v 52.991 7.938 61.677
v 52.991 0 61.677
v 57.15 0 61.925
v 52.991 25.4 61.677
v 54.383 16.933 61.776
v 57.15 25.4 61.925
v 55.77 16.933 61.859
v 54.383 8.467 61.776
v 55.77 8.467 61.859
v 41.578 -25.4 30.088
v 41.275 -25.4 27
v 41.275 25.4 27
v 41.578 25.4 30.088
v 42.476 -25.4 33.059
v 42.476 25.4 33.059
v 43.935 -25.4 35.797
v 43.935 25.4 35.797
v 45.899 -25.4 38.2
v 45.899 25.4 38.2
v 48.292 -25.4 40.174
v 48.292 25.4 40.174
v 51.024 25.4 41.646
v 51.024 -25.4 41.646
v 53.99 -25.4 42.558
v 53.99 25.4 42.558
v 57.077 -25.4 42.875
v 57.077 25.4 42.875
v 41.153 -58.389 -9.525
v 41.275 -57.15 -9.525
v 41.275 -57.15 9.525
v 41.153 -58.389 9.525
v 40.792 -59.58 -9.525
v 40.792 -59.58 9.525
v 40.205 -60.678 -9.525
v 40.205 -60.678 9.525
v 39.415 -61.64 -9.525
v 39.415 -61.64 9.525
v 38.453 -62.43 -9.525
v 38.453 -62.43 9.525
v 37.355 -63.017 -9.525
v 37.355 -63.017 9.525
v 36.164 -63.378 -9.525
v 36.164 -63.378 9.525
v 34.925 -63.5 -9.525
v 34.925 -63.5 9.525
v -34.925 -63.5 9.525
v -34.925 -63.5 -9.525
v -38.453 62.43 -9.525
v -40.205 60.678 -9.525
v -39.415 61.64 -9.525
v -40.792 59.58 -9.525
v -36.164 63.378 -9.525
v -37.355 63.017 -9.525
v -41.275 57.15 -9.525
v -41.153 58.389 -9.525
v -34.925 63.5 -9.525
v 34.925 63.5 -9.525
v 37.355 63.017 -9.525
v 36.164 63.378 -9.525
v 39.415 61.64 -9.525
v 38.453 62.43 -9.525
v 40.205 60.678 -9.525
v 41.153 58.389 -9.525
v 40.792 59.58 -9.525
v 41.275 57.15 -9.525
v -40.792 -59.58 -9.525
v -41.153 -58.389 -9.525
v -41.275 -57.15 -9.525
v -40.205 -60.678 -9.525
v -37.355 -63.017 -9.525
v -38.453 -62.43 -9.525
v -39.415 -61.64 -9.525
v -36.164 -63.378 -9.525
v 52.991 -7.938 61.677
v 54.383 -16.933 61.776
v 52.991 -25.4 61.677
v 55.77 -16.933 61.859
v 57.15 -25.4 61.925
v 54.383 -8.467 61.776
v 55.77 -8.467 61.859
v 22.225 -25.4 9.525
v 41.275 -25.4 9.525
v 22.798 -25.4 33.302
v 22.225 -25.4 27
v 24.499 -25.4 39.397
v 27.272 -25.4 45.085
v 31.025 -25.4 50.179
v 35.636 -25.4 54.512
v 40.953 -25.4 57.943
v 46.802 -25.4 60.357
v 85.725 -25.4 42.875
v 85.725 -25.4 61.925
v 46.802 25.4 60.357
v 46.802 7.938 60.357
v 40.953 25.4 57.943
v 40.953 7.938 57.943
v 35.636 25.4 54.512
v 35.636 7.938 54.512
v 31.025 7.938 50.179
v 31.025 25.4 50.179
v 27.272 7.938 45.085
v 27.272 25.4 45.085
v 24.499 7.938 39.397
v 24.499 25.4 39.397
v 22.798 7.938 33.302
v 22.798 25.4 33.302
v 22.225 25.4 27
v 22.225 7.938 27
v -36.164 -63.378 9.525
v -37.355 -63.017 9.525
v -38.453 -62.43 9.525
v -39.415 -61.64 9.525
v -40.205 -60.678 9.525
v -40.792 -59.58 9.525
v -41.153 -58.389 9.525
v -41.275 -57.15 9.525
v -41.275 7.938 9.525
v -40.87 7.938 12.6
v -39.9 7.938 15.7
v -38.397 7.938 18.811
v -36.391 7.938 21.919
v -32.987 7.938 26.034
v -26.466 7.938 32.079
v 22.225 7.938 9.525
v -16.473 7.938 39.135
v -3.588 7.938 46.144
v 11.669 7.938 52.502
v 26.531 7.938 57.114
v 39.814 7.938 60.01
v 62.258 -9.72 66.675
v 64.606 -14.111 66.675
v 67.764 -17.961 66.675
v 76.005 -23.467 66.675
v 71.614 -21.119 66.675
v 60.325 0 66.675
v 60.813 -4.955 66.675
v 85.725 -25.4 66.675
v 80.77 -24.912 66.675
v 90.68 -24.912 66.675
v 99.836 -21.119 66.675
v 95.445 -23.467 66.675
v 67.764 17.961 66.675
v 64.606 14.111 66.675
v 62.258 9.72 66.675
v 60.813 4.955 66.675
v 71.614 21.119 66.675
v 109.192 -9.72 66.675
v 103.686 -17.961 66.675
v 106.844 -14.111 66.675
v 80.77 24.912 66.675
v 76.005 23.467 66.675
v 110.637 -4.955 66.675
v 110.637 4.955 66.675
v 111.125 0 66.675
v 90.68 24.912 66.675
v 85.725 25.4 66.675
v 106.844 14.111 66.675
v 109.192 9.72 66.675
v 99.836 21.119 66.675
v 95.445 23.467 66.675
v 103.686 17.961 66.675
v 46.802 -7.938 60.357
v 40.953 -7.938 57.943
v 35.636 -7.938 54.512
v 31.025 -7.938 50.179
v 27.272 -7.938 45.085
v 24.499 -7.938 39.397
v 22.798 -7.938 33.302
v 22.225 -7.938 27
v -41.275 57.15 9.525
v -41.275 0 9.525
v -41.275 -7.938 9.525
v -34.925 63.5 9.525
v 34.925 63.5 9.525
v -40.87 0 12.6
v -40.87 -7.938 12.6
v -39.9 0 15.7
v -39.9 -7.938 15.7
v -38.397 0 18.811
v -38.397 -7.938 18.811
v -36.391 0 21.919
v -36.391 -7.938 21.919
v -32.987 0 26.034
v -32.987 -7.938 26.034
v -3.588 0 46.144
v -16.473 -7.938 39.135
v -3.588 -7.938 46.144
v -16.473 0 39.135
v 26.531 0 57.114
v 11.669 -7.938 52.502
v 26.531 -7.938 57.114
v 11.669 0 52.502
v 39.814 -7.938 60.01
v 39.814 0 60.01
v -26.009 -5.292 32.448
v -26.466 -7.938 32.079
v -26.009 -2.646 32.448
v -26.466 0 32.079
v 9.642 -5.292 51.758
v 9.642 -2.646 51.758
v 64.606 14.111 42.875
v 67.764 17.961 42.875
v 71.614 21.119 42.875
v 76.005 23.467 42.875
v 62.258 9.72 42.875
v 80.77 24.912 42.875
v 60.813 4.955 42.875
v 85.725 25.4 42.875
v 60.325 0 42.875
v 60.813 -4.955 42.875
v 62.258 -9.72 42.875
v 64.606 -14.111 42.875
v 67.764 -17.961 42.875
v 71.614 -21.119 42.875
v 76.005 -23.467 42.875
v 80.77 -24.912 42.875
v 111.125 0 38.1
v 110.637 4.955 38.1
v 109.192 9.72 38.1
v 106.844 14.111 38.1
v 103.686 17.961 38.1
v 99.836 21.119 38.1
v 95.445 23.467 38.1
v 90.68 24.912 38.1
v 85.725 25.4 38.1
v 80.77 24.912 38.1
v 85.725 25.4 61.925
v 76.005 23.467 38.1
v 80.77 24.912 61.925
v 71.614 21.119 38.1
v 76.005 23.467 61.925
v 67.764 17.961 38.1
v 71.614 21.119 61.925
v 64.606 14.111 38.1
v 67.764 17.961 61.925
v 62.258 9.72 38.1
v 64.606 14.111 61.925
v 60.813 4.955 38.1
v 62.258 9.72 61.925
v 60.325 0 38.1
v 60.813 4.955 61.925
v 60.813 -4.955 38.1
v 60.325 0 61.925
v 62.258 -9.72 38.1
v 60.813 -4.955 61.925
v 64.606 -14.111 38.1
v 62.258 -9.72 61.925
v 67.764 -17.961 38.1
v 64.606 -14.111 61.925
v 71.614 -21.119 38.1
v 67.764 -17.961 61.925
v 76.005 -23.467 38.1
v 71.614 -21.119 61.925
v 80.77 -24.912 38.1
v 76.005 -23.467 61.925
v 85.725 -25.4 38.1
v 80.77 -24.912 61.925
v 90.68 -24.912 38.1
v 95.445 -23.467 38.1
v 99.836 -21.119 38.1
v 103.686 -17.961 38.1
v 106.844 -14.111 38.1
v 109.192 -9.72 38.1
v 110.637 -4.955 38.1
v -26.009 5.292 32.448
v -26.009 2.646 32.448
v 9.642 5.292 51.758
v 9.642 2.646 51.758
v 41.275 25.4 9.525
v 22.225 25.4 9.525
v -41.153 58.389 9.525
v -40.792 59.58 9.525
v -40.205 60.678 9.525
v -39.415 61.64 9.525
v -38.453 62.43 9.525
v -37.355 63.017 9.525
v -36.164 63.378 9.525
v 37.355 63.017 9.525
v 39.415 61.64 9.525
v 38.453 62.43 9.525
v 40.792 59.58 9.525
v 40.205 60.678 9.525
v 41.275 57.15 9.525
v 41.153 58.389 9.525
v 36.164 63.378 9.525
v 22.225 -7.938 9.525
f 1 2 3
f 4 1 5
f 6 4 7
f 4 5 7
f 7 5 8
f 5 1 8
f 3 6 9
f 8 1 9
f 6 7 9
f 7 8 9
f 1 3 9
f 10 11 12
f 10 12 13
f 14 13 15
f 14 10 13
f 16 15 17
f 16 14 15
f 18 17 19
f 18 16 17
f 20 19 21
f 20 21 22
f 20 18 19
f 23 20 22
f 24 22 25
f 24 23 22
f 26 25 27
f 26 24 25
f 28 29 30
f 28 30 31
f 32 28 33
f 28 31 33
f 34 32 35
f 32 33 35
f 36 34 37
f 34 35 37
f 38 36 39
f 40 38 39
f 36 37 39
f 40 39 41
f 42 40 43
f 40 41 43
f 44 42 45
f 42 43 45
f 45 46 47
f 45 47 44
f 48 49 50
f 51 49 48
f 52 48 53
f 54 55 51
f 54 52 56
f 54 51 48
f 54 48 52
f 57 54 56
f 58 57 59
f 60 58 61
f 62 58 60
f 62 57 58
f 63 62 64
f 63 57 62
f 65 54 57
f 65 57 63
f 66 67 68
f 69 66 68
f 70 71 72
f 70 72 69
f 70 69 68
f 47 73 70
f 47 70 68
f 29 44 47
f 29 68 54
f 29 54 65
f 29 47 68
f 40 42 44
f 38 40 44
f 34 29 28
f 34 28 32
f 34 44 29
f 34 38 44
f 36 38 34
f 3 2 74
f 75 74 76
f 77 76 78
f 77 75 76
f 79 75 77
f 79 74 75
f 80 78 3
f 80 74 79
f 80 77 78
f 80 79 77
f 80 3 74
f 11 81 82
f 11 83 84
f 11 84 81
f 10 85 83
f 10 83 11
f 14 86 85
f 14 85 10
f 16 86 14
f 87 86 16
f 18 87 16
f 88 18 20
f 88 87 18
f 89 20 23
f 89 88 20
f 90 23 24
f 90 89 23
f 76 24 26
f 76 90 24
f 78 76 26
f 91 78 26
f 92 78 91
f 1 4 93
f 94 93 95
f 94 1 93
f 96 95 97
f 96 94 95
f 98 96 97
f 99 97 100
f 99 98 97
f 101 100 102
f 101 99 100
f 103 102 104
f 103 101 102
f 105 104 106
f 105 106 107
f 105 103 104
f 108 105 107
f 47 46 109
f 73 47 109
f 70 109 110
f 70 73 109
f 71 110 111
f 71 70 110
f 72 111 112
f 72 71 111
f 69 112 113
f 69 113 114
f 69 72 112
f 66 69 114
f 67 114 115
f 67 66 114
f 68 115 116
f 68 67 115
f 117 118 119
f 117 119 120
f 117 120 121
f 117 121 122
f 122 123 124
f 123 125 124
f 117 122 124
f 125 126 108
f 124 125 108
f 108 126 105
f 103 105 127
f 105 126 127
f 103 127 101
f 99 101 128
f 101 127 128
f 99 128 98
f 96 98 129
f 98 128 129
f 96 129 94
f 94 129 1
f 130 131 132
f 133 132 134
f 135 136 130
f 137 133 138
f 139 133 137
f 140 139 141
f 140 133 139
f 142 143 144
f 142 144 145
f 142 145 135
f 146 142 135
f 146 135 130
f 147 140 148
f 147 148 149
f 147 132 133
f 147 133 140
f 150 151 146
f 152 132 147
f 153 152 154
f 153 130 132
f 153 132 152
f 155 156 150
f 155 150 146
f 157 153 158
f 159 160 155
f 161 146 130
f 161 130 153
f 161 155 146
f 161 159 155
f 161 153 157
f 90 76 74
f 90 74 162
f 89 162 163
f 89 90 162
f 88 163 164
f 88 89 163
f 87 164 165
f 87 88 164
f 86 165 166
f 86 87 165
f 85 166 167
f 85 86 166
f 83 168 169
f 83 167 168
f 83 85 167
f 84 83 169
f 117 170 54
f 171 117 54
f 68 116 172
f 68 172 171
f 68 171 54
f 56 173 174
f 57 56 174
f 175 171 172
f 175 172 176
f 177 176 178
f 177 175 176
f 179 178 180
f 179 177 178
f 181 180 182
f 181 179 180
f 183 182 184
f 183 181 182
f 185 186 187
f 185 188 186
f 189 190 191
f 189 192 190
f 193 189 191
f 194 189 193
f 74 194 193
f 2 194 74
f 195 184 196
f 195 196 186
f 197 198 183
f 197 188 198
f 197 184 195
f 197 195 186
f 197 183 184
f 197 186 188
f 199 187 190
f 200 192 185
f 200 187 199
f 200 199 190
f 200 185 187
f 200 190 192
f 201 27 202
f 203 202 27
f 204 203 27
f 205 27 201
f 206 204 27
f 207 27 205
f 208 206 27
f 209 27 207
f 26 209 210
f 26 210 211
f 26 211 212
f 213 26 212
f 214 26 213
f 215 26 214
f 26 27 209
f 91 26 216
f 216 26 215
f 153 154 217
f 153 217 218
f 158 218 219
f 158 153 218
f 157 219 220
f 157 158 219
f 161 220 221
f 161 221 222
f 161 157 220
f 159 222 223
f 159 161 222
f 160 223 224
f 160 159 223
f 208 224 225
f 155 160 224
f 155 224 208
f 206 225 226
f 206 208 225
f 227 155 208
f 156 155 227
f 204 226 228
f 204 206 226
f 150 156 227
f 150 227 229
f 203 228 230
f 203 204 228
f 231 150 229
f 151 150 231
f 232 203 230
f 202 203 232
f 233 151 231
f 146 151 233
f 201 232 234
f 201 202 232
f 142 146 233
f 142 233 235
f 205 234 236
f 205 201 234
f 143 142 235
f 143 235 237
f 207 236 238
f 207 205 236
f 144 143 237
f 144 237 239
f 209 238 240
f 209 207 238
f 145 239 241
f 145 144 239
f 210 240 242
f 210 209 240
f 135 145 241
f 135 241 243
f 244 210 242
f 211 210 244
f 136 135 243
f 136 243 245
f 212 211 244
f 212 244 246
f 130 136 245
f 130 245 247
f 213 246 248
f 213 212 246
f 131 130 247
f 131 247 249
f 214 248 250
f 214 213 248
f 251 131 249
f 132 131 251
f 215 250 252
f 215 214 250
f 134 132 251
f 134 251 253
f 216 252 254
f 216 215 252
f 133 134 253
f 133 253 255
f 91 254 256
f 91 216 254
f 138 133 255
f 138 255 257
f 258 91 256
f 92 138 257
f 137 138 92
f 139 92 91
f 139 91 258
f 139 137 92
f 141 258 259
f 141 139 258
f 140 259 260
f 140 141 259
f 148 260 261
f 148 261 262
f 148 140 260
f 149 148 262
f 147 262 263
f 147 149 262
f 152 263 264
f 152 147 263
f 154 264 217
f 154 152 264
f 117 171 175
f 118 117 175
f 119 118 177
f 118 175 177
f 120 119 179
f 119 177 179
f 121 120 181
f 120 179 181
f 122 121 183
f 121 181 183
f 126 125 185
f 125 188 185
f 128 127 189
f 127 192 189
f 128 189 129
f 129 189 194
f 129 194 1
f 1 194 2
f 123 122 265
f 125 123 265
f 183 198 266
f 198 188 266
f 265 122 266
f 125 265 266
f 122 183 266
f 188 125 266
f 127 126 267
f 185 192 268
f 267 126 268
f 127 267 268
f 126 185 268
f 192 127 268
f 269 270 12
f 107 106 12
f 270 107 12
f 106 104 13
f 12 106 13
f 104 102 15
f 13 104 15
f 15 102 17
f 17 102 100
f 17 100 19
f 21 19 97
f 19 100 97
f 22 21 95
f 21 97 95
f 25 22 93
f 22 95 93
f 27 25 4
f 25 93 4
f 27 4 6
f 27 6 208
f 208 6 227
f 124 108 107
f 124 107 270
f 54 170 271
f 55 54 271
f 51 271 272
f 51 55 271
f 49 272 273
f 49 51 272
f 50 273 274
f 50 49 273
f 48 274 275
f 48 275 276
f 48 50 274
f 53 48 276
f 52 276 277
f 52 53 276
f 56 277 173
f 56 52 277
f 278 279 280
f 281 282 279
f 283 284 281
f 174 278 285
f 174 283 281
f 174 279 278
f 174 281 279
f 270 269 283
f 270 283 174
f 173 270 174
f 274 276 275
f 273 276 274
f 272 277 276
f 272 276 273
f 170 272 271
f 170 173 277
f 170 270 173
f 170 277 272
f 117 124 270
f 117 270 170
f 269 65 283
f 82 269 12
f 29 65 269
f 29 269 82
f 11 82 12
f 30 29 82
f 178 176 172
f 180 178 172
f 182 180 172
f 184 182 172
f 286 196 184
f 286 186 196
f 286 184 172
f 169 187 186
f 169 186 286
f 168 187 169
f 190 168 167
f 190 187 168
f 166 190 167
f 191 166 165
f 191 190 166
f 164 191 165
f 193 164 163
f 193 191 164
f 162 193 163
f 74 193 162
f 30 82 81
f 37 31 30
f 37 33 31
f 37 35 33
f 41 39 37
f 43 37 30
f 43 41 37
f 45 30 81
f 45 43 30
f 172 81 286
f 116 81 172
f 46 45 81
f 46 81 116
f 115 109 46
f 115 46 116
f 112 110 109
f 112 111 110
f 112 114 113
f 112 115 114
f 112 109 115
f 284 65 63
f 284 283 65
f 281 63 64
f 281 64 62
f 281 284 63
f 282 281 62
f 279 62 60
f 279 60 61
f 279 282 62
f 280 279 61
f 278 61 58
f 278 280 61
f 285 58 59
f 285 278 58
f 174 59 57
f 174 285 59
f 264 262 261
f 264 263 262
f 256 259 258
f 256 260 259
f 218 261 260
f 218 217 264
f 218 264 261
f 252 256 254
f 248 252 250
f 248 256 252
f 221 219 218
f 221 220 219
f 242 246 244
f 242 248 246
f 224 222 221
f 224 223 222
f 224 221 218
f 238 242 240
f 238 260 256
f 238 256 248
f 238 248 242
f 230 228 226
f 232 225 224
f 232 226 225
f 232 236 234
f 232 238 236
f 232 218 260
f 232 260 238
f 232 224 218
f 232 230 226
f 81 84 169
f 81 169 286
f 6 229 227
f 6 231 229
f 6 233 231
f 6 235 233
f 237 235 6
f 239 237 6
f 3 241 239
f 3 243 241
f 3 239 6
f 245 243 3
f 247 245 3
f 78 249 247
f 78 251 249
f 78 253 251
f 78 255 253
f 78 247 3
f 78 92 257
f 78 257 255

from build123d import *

# Parameters (mm, degrees)
F1_DEPTH = 63.5
F0_W     = 25.4
F0_H     = 19.05
F2_DEPTH = 25.4
F3_DEPTH = 7.9375
F5_R     = 6.35


# Not quite as in the source:
# - a feature names something its author has since deleted; it is built from what else it names


with BuildPart() as f1:
    # F0 (on Front) → F1 (new body, symmetric)
    with BuildSketch(Plane.XZ):
        Polygon((41.275, -9.525), (41.275, 9.525), (22.225, 9.525), (-41.275, 9.525), (-41.275, -9.525), align=None)
    extrude(amount=F1_DEPTH, both=True)

    # F0 (on Front) → F2 (join, symmetric)
    with BuildSketch(Plane.XZ):
        with BuildLine():
            Line((22.225, 9.525), (41.275, 9.525))
            Line((41.275, 9.525), (41.275, 27.0003691794))
            ThreePointArc((41.275, 27.0003691794), (45.8987977719, 38.19974744), (57.0767100375, 42.8752))
            Line((57.0767100375, 42.8752), (60.325, 42.8752))
            Line((60.325, 42.8752), (60.325, 61.9252))
            Line((60.325, 61.9252), (57.15, 61.9252))
            add(Edge.make_bspline(
                [(52.9909613243, 61.6768456771), (54.385845827, 61.7839036656), (55.7728431111, 61.8669849), (57.15, 61.9252)],
                knots=[107.9985895846, 107.9985895846, 107.9985895846, 107.9985895846, 111.5045361635, 111.5045361635, 111.5045361635, 111.5045361635], degree=3))
            ThreePointArc((52.9909613243, 61.6768456771), (31.0252028644, 50.1790360873), (22.225, 27.0003691794))
            Line((22.225, 27.0003691794), (22.225, 9.525))
        make_face()
        with Locations((73.025, 52.4002)):
            Rectangle(F0_W, F0_H)
    extrude(amount=F2_DEPTH, both=True)

    # F0 (on Front) → F3 (join, symmetric)
    with BuildSketch(Plane.XZ):
        with BuildLine():
            Line((-41.275, 9.525), (22.225, 9.525))
            Line((22.225, 9.525), (22.225, 27.0003691794))
            ThreePointArc((22.225, 27.0003691794), (31.0252028644, 50.1790360873), (52.9909613243, 61.6768456771))
            add(Edge.make_bspline(
                [(-41.275, 9.525), (-40.4304762971, 32.3293201332), (10.0223776518, 58.3789883087), (52.9909613243, 61.6768456771)],
                knots=[0, 0, 0, 0, 107.9985895846, 107.9985895846, 107.9985895846, 107.9985895846], degree=3))
        make_face()
    extrude(amount=F3_DEPTH, both=True)

    # F0 (on Front) → F4 (revolve)
    with BuildSketch(Plane.XZ):
        Polygon((85.725, 61.9252), (85.725, 42.8752), (85.725, 38.1), (111.125, 38.1), (111.125, 66.675), (85.725, 66.675), align=None)
    revolve(axis=Axis((85.725, 0, 52.3875), (0, 0, 1)))

    # F5
    f5_edges = [f1.edges().sort_by_distance(p)[0] for p in [
        (41.275, -63.5, 0),
        (-41.275, -63.5, 0),
        (41.275, 63.5, 0),
        (-41.275, 63.5, 0),
    ]]
    fillet(f5_edges, radius=F5_R)


solid = f1.part
